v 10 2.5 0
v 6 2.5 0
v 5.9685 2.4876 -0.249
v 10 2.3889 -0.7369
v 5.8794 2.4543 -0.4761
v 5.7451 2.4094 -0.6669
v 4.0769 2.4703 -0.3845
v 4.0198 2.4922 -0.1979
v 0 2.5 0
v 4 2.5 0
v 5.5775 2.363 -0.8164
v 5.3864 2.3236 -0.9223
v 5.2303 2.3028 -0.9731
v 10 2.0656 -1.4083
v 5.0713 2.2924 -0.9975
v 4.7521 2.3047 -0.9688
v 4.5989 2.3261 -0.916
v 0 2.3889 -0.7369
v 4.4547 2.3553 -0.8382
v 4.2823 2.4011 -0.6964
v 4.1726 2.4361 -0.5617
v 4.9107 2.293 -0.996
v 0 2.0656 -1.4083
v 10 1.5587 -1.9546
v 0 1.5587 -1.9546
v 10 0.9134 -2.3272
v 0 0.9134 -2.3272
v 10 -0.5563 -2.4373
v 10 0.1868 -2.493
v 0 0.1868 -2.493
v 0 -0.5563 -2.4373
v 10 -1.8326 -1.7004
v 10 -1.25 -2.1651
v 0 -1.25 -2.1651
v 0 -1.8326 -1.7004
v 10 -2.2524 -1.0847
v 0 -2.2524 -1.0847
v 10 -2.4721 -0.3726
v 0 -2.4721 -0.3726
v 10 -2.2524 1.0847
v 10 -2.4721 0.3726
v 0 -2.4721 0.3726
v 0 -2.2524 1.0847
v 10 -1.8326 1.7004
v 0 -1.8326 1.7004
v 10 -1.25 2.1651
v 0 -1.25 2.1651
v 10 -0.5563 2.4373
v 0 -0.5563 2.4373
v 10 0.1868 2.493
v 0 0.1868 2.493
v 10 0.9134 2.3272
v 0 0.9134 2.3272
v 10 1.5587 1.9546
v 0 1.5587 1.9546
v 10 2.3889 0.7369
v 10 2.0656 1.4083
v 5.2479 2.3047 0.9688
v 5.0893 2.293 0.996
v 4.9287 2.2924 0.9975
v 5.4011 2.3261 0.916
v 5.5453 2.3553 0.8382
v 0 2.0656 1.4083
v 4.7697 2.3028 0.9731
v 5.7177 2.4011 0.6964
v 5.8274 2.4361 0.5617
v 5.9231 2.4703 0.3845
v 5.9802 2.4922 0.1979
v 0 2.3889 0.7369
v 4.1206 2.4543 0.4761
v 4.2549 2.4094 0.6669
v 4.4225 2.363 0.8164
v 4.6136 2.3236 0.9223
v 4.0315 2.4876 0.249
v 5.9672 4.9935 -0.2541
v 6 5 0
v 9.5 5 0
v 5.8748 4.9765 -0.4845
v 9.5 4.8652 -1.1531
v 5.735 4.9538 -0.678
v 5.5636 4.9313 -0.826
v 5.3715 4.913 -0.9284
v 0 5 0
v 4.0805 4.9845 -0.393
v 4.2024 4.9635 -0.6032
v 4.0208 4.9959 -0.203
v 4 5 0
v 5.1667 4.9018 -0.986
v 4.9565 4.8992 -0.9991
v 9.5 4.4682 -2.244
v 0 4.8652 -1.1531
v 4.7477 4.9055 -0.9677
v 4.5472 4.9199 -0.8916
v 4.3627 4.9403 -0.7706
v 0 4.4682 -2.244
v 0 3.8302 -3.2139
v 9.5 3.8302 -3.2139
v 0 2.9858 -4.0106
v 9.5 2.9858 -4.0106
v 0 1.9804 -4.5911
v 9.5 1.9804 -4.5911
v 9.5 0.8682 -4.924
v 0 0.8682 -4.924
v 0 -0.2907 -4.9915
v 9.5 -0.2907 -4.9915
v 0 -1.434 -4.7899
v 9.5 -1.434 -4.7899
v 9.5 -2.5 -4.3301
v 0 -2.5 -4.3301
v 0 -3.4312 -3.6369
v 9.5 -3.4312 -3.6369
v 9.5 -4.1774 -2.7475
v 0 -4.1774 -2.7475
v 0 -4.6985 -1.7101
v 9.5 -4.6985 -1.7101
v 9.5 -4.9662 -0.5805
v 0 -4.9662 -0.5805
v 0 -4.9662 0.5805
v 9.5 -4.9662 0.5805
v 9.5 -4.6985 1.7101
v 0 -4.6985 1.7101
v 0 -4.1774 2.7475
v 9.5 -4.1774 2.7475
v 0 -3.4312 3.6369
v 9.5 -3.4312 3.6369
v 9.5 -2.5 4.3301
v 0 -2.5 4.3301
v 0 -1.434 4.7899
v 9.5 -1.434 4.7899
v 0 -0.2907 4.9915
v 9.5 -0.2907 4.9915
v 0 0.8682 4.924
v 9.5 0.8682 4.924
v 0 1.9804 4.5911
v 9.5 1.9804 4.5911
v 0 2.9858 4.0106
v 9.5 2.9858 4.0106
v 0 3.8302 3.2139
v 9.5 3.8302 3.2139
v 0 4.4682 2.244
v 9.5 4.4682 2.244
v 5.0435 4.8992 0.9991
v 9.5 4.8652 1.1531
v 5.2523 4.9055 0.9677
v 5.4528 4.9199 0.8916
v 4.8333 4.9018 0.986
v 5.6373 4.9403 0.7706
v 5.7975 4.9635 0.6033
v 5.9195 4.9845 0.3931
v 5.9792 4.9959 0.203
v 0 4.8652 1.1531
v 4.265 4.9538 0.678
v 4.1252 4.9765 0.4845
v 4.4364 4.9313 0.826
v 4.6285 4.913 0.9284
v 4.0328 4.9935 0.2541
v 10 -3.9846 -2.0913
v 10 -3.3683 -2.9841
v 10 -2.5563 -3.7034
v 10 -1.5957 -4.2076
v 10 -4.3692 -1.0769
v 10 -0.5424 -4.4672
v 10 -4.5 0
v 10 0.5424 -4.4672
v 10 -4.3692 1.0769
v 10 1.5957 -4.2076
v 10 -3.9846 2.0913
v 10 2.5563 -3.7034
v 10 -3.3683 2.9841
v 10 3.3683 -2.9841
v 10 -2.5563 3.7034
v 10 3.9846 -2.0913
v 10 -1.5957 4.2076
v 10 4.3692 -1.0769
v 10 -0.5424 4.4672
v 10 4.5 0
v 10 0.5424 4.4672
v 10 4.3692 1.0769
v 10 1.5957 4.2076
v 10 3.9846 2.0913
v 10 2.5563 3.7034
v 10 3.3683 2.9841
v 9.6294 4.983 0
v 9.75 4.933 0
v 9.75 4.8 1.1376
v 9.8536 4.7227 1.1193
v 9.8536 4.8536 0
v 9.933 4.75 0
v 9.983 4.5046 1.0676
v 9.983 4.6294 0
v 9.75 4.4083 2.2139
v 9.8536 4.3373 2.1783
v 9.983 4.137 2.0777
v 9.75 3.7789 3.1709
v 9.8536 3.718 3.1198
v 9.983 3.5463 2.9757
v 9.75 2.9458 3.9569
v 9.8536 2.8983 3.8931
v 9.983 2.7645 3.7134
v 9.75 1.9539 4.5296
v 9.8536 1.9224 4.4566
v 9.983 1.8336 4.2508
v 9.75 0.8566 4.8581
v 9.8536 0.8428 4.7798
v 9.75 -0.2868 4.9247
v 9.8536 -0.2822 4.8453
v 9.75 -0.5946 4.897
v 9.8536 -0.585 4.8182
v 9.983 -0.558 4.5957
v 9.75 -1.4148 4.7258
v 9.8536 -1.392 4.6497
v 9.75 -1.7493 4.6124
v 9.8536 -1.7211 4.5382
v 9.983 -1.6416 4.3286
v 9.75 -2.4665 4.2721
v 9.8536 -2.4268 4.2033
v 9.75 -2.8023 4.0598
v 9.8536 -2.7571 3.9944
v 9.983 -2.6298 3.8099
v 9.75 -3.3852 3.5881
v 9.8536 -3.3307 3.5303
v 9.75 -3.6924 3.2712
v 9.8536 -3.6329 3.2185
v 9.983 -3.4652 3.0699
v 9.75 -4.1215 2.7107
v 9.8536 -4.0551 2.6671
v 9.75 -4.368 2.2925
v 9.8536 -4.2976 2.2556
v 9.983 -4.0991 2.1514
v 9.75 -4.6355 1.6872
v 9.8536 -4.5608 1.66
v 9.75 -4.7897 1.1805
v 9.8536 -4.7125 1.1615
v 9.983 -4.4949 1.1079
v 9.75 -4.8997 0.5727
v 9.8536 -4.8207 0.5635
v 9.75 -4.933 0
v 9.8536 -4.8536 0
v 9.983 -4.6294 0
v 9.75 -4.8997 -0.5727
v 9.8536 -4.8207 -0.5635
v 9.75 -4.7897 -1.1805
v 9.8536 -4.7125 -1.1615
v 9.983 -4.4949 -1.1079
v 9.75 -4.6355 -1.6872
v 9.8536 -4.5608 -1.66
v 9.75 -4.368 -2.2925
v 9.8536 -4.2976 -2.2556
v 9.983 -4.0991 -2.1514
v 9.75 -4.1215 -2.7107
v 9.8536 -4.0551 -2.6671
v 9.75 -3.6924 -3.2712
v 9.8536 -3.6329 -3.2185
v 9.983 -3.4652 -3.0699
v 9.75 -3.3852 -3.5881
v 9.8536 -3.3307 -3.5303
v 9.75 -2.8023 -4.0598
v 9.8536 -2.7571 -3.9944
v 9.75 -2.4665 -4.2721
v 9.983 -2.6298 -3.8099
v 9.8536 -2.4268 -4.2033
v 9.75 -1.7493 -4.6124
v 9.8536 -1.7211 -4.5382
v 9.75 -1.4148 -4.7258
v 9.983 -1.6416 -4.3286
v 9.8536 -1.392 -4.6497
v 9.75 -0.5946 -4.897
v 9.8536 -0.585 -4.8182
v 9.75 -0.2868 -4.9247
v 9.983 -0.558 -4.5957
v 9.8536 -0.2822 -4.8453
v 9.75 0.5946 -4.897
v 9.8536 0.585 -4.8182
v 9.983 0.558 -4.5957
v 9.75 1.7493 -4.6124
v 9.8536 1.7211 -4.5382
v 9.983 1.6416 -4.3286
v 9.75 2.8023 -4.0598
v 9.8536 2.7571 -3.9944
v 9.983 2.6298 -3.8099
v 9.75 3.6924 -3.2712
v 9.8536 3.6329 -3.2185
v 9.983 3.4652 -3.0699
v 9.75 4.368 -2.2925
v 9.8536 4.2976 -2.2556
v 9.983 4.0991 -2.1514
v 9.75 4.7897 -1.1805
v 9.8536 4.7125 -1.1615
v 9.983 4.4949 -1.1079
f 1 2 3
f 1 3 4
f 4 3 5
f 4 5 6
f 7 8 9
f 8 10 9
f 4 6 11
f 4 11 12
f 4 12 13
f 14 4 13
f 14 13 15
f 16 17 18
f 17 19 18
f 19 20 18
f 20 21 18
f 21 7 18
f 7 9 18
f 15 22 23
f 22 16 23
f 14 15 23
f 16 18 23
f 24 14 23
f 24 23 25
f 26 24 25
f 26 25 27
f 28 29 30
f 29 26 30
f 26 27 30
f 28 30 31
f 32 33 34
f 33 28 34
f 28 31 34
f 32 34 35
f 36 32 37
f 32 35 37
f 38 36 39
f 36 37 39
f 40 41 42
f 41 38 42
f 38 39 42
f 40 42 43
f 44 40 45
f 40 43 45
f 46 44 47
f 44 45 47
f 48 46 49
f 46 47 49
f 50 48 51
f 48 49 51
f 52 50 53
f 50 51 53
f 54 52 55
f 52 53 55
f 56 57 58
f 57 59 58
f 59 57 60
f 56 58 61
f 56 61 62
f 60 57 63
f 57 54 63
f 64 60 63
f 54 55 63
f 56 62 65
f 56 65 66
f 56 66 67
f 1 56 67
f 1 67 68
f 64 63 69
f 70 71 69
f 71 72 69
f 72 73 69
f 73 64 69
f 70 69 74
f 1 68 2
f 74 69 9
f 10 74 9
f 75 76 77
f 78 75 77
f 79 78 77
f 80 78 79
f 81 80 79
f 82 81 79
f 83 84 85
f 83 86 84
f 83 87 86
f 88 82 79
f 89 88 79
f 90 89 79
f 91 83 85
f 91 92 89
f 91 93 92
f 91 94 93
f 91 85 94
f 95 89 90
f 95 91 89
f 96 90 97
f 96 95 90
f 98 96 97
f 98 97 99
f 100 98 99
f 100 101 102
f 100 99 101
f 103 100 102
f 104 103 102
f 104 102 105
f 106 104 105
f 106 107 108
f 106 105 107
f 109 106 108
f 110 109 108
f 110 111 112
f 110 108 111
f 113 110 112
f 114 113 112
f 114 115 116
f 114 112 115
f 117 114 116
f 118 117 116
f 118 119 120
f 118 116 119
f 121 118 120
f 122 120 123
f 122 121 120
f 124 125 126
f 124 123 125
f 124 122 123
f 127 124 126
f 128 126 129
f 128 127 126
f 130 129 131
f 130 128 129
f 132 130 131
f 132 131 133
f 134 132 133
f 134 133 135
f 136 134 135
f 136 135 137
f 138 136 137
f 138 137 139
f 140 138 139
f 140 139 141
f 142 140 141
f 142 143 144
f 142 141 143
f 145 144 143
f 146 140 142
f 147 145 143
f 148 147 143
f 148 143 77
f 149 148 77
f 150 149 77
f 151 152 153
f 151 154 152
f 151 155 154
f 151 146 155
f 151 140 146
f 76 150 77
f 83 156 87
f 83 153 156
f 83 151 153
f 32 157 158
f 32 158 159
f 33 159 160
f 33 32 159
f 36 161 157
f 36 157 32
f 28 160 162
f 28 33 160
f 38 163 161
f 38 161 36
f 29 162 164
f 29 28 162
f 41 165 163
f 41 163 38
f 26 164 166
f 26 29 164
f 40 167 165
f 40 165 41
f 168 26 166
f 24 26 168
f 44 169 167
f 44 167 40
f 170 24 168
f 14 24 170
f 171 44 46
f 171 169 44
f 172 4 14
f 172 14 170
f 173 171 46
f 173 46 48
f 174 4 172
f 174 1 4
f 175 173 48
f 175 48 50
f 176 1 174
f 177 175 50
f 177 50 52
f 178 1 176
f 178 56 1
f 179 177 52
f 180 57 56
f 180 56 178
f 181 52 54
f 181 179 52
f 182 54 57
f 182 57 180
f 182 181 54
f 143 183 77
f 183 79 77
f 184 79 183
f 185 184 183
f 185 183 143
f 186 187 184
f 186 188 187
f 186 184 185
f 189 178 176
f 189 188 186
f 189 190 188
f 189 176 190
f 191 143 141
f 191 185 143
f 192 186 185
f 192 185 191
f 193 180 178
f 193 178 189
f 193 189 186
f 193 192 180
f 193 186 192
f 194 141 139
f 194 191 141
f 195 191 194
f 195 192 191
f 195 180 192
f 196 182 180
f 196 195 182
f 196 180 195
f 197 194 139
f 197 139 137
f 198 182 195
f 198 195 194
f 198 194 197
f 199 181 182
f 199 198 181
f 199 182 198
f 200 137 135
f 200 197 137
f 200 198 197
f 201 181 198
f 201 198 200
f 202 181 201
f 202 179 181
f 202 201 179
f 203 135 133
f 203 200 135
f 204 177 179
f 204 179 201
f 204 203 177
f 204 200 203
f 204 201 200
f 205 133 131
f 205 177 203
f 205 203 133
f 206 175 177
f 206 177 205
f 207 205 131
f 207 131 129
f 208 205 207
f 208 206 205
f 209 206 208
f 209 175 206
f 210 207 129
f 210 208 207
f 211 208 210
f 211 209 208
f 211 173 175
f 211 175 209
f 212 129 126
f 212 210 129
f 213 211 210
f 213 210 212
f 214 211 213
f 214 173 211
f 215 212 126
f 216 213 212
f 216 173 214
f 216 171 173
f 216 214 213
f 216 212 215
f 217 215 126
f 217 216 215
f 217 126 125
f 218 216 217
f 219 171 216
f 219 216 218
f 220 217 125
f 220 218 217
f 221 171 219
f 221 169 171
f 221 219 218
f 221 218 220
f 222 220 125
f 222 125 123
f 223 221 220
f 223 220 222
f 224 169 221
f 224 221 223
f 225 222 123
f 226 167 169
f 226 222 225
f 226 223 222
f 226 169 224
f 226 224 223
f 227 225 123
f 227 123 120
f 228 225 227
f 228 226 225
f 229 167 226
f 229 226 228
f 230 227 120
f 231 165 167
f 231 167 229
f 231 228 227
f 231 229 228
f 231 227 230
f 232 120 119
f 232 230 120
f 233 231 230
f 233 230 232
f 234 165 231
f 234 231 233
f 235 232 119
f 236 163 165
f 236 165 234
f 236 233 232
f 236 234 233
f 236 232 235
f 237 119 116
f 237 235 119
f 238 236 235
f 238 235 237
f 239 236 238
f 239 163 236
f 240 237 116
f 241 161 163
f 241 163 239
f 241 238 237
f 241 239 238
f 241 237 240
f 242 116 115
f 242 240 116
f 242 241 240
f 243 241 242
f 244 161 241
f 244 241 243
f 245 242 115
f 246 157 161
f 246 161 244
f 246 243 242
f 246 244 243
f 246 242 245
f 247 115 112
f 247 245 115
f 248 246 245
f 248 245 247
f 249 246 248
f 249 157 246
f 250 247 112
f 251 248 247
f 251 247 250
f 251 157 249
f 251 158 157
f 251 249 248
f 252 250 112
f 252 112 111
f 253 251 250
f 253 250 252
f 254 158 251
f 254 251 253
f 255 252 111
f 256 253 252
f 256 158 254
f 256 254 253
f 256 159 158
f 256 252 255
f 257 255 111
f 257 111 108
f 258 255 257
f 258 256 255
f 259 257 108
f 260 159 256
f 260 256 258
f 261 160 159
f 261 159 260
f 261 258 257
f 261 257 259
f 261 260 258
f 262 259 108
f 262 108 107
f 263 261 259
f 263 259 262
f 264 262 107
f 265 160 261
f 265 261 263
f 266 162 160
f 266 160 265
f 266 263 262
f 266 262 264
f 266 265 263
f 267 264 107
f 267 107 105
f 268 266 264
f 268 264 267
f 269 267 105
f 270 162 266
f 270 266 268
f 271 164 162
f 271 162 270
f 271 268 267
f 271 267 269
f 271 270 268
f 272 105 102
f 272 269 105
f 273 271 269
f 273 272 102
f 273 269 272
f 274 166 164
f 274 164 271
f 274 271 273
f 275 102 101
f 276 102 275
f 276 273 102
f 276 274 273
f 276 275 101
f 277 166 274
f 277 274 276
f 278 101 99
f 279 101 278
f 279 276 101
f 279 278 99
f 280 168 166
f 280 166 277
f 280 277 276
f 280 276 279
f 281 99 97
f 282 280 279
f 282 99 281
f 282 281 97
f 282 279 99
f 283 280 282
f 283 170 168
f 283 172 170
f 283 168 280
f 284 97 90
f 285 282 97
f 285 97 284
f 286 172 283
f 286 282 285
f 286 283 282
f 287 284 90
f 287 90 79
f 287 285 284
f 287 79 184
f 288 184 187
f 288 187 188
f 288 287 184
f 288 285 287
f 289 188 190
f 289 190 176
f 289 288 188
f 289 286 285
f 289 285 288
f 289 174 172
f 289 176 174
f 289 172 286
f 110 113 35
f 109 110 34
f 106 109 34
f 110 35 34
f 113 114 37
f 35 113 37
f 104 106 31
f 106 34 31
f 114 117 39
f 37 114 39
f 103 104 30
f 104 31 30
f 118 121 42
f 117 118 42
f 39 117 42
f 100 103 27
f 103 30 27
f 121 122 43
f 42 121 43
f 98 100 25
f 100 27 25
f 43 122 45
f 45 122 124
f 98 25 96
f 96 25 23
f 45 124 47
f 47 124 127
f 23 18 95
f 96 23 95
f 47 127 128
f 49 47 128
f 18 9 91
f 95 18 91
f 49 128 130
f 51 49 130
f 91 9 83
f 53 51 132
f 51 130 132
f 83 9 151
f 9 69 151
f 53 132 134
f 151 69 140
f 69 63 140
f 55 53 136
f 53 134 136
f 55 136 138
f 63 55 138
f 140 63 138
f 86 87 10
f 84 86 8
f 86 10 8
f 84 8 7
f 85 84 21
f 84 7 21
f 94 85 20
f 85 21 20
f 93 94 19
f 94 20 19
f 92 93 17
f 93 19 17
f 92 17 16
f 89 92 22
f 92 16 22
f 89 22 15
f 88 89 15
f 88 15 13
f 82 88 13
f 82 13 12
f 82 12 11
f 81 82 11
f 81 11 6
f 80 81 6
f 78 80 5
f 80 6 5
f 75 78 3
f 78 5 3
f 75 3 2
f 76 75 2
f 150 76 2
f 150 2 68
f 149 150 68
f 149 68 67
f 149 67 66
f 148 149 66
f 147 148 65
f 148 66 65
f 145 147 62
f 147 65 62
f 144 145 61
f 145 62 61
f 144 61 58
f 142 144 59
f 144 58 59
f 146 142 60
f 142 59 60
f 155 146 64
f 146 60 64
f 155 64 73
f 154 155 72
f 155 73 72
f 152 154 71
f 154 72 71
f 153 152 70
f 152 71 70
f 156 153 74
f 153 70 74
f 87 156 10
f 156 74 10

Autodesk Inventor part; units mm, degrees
ref_plane "YZ Plane" through (0, 0, 0) normal (1, 0, 0) x (0, 1, 0)
ref_plane "XZ Plane" through (0, 0, 0) normal (0, 1, 0) x (-1, 0, 0)
ref_plane "XY Plane" through (0, 0, 0) normal (0, 0, 1) x (1, 0, 0)
sketch "Sketch1" plane through (0, 0, 0) normal (1, 0, 0) x (0, 1, 0)
  circle A0 centre (0, 0) radius 2.5
  circle A1 centre (0, 0) radius 5
  dimension "d0" = 5
  dimension "d1" = 10
extrude "Extrusion1" add sketch "Sketch1" along normal blind 10
sketch "Sketch2" plane through (0, 0, 0) normal (0, 1, 0) x (-1, 0, 0)
  line L0 (0, 0) -> (-5, 0)
  circle A0 centre (-5, 0) radius 1
  dimension "d4" = 5
  dimension "d5" = 2
extrude "Extrusion2" cut sketch "Sketch2" along normal blind 10
thread "Thread1" size "M2x0.4" class "6H" standard "ANSI Metric M Profile" full length
fillet "Fillet1" radius 0.5 1 edges at (10, -5, 0)
properties part number "wormgear_worm_axes_holder" material "Aluminum 6061"
